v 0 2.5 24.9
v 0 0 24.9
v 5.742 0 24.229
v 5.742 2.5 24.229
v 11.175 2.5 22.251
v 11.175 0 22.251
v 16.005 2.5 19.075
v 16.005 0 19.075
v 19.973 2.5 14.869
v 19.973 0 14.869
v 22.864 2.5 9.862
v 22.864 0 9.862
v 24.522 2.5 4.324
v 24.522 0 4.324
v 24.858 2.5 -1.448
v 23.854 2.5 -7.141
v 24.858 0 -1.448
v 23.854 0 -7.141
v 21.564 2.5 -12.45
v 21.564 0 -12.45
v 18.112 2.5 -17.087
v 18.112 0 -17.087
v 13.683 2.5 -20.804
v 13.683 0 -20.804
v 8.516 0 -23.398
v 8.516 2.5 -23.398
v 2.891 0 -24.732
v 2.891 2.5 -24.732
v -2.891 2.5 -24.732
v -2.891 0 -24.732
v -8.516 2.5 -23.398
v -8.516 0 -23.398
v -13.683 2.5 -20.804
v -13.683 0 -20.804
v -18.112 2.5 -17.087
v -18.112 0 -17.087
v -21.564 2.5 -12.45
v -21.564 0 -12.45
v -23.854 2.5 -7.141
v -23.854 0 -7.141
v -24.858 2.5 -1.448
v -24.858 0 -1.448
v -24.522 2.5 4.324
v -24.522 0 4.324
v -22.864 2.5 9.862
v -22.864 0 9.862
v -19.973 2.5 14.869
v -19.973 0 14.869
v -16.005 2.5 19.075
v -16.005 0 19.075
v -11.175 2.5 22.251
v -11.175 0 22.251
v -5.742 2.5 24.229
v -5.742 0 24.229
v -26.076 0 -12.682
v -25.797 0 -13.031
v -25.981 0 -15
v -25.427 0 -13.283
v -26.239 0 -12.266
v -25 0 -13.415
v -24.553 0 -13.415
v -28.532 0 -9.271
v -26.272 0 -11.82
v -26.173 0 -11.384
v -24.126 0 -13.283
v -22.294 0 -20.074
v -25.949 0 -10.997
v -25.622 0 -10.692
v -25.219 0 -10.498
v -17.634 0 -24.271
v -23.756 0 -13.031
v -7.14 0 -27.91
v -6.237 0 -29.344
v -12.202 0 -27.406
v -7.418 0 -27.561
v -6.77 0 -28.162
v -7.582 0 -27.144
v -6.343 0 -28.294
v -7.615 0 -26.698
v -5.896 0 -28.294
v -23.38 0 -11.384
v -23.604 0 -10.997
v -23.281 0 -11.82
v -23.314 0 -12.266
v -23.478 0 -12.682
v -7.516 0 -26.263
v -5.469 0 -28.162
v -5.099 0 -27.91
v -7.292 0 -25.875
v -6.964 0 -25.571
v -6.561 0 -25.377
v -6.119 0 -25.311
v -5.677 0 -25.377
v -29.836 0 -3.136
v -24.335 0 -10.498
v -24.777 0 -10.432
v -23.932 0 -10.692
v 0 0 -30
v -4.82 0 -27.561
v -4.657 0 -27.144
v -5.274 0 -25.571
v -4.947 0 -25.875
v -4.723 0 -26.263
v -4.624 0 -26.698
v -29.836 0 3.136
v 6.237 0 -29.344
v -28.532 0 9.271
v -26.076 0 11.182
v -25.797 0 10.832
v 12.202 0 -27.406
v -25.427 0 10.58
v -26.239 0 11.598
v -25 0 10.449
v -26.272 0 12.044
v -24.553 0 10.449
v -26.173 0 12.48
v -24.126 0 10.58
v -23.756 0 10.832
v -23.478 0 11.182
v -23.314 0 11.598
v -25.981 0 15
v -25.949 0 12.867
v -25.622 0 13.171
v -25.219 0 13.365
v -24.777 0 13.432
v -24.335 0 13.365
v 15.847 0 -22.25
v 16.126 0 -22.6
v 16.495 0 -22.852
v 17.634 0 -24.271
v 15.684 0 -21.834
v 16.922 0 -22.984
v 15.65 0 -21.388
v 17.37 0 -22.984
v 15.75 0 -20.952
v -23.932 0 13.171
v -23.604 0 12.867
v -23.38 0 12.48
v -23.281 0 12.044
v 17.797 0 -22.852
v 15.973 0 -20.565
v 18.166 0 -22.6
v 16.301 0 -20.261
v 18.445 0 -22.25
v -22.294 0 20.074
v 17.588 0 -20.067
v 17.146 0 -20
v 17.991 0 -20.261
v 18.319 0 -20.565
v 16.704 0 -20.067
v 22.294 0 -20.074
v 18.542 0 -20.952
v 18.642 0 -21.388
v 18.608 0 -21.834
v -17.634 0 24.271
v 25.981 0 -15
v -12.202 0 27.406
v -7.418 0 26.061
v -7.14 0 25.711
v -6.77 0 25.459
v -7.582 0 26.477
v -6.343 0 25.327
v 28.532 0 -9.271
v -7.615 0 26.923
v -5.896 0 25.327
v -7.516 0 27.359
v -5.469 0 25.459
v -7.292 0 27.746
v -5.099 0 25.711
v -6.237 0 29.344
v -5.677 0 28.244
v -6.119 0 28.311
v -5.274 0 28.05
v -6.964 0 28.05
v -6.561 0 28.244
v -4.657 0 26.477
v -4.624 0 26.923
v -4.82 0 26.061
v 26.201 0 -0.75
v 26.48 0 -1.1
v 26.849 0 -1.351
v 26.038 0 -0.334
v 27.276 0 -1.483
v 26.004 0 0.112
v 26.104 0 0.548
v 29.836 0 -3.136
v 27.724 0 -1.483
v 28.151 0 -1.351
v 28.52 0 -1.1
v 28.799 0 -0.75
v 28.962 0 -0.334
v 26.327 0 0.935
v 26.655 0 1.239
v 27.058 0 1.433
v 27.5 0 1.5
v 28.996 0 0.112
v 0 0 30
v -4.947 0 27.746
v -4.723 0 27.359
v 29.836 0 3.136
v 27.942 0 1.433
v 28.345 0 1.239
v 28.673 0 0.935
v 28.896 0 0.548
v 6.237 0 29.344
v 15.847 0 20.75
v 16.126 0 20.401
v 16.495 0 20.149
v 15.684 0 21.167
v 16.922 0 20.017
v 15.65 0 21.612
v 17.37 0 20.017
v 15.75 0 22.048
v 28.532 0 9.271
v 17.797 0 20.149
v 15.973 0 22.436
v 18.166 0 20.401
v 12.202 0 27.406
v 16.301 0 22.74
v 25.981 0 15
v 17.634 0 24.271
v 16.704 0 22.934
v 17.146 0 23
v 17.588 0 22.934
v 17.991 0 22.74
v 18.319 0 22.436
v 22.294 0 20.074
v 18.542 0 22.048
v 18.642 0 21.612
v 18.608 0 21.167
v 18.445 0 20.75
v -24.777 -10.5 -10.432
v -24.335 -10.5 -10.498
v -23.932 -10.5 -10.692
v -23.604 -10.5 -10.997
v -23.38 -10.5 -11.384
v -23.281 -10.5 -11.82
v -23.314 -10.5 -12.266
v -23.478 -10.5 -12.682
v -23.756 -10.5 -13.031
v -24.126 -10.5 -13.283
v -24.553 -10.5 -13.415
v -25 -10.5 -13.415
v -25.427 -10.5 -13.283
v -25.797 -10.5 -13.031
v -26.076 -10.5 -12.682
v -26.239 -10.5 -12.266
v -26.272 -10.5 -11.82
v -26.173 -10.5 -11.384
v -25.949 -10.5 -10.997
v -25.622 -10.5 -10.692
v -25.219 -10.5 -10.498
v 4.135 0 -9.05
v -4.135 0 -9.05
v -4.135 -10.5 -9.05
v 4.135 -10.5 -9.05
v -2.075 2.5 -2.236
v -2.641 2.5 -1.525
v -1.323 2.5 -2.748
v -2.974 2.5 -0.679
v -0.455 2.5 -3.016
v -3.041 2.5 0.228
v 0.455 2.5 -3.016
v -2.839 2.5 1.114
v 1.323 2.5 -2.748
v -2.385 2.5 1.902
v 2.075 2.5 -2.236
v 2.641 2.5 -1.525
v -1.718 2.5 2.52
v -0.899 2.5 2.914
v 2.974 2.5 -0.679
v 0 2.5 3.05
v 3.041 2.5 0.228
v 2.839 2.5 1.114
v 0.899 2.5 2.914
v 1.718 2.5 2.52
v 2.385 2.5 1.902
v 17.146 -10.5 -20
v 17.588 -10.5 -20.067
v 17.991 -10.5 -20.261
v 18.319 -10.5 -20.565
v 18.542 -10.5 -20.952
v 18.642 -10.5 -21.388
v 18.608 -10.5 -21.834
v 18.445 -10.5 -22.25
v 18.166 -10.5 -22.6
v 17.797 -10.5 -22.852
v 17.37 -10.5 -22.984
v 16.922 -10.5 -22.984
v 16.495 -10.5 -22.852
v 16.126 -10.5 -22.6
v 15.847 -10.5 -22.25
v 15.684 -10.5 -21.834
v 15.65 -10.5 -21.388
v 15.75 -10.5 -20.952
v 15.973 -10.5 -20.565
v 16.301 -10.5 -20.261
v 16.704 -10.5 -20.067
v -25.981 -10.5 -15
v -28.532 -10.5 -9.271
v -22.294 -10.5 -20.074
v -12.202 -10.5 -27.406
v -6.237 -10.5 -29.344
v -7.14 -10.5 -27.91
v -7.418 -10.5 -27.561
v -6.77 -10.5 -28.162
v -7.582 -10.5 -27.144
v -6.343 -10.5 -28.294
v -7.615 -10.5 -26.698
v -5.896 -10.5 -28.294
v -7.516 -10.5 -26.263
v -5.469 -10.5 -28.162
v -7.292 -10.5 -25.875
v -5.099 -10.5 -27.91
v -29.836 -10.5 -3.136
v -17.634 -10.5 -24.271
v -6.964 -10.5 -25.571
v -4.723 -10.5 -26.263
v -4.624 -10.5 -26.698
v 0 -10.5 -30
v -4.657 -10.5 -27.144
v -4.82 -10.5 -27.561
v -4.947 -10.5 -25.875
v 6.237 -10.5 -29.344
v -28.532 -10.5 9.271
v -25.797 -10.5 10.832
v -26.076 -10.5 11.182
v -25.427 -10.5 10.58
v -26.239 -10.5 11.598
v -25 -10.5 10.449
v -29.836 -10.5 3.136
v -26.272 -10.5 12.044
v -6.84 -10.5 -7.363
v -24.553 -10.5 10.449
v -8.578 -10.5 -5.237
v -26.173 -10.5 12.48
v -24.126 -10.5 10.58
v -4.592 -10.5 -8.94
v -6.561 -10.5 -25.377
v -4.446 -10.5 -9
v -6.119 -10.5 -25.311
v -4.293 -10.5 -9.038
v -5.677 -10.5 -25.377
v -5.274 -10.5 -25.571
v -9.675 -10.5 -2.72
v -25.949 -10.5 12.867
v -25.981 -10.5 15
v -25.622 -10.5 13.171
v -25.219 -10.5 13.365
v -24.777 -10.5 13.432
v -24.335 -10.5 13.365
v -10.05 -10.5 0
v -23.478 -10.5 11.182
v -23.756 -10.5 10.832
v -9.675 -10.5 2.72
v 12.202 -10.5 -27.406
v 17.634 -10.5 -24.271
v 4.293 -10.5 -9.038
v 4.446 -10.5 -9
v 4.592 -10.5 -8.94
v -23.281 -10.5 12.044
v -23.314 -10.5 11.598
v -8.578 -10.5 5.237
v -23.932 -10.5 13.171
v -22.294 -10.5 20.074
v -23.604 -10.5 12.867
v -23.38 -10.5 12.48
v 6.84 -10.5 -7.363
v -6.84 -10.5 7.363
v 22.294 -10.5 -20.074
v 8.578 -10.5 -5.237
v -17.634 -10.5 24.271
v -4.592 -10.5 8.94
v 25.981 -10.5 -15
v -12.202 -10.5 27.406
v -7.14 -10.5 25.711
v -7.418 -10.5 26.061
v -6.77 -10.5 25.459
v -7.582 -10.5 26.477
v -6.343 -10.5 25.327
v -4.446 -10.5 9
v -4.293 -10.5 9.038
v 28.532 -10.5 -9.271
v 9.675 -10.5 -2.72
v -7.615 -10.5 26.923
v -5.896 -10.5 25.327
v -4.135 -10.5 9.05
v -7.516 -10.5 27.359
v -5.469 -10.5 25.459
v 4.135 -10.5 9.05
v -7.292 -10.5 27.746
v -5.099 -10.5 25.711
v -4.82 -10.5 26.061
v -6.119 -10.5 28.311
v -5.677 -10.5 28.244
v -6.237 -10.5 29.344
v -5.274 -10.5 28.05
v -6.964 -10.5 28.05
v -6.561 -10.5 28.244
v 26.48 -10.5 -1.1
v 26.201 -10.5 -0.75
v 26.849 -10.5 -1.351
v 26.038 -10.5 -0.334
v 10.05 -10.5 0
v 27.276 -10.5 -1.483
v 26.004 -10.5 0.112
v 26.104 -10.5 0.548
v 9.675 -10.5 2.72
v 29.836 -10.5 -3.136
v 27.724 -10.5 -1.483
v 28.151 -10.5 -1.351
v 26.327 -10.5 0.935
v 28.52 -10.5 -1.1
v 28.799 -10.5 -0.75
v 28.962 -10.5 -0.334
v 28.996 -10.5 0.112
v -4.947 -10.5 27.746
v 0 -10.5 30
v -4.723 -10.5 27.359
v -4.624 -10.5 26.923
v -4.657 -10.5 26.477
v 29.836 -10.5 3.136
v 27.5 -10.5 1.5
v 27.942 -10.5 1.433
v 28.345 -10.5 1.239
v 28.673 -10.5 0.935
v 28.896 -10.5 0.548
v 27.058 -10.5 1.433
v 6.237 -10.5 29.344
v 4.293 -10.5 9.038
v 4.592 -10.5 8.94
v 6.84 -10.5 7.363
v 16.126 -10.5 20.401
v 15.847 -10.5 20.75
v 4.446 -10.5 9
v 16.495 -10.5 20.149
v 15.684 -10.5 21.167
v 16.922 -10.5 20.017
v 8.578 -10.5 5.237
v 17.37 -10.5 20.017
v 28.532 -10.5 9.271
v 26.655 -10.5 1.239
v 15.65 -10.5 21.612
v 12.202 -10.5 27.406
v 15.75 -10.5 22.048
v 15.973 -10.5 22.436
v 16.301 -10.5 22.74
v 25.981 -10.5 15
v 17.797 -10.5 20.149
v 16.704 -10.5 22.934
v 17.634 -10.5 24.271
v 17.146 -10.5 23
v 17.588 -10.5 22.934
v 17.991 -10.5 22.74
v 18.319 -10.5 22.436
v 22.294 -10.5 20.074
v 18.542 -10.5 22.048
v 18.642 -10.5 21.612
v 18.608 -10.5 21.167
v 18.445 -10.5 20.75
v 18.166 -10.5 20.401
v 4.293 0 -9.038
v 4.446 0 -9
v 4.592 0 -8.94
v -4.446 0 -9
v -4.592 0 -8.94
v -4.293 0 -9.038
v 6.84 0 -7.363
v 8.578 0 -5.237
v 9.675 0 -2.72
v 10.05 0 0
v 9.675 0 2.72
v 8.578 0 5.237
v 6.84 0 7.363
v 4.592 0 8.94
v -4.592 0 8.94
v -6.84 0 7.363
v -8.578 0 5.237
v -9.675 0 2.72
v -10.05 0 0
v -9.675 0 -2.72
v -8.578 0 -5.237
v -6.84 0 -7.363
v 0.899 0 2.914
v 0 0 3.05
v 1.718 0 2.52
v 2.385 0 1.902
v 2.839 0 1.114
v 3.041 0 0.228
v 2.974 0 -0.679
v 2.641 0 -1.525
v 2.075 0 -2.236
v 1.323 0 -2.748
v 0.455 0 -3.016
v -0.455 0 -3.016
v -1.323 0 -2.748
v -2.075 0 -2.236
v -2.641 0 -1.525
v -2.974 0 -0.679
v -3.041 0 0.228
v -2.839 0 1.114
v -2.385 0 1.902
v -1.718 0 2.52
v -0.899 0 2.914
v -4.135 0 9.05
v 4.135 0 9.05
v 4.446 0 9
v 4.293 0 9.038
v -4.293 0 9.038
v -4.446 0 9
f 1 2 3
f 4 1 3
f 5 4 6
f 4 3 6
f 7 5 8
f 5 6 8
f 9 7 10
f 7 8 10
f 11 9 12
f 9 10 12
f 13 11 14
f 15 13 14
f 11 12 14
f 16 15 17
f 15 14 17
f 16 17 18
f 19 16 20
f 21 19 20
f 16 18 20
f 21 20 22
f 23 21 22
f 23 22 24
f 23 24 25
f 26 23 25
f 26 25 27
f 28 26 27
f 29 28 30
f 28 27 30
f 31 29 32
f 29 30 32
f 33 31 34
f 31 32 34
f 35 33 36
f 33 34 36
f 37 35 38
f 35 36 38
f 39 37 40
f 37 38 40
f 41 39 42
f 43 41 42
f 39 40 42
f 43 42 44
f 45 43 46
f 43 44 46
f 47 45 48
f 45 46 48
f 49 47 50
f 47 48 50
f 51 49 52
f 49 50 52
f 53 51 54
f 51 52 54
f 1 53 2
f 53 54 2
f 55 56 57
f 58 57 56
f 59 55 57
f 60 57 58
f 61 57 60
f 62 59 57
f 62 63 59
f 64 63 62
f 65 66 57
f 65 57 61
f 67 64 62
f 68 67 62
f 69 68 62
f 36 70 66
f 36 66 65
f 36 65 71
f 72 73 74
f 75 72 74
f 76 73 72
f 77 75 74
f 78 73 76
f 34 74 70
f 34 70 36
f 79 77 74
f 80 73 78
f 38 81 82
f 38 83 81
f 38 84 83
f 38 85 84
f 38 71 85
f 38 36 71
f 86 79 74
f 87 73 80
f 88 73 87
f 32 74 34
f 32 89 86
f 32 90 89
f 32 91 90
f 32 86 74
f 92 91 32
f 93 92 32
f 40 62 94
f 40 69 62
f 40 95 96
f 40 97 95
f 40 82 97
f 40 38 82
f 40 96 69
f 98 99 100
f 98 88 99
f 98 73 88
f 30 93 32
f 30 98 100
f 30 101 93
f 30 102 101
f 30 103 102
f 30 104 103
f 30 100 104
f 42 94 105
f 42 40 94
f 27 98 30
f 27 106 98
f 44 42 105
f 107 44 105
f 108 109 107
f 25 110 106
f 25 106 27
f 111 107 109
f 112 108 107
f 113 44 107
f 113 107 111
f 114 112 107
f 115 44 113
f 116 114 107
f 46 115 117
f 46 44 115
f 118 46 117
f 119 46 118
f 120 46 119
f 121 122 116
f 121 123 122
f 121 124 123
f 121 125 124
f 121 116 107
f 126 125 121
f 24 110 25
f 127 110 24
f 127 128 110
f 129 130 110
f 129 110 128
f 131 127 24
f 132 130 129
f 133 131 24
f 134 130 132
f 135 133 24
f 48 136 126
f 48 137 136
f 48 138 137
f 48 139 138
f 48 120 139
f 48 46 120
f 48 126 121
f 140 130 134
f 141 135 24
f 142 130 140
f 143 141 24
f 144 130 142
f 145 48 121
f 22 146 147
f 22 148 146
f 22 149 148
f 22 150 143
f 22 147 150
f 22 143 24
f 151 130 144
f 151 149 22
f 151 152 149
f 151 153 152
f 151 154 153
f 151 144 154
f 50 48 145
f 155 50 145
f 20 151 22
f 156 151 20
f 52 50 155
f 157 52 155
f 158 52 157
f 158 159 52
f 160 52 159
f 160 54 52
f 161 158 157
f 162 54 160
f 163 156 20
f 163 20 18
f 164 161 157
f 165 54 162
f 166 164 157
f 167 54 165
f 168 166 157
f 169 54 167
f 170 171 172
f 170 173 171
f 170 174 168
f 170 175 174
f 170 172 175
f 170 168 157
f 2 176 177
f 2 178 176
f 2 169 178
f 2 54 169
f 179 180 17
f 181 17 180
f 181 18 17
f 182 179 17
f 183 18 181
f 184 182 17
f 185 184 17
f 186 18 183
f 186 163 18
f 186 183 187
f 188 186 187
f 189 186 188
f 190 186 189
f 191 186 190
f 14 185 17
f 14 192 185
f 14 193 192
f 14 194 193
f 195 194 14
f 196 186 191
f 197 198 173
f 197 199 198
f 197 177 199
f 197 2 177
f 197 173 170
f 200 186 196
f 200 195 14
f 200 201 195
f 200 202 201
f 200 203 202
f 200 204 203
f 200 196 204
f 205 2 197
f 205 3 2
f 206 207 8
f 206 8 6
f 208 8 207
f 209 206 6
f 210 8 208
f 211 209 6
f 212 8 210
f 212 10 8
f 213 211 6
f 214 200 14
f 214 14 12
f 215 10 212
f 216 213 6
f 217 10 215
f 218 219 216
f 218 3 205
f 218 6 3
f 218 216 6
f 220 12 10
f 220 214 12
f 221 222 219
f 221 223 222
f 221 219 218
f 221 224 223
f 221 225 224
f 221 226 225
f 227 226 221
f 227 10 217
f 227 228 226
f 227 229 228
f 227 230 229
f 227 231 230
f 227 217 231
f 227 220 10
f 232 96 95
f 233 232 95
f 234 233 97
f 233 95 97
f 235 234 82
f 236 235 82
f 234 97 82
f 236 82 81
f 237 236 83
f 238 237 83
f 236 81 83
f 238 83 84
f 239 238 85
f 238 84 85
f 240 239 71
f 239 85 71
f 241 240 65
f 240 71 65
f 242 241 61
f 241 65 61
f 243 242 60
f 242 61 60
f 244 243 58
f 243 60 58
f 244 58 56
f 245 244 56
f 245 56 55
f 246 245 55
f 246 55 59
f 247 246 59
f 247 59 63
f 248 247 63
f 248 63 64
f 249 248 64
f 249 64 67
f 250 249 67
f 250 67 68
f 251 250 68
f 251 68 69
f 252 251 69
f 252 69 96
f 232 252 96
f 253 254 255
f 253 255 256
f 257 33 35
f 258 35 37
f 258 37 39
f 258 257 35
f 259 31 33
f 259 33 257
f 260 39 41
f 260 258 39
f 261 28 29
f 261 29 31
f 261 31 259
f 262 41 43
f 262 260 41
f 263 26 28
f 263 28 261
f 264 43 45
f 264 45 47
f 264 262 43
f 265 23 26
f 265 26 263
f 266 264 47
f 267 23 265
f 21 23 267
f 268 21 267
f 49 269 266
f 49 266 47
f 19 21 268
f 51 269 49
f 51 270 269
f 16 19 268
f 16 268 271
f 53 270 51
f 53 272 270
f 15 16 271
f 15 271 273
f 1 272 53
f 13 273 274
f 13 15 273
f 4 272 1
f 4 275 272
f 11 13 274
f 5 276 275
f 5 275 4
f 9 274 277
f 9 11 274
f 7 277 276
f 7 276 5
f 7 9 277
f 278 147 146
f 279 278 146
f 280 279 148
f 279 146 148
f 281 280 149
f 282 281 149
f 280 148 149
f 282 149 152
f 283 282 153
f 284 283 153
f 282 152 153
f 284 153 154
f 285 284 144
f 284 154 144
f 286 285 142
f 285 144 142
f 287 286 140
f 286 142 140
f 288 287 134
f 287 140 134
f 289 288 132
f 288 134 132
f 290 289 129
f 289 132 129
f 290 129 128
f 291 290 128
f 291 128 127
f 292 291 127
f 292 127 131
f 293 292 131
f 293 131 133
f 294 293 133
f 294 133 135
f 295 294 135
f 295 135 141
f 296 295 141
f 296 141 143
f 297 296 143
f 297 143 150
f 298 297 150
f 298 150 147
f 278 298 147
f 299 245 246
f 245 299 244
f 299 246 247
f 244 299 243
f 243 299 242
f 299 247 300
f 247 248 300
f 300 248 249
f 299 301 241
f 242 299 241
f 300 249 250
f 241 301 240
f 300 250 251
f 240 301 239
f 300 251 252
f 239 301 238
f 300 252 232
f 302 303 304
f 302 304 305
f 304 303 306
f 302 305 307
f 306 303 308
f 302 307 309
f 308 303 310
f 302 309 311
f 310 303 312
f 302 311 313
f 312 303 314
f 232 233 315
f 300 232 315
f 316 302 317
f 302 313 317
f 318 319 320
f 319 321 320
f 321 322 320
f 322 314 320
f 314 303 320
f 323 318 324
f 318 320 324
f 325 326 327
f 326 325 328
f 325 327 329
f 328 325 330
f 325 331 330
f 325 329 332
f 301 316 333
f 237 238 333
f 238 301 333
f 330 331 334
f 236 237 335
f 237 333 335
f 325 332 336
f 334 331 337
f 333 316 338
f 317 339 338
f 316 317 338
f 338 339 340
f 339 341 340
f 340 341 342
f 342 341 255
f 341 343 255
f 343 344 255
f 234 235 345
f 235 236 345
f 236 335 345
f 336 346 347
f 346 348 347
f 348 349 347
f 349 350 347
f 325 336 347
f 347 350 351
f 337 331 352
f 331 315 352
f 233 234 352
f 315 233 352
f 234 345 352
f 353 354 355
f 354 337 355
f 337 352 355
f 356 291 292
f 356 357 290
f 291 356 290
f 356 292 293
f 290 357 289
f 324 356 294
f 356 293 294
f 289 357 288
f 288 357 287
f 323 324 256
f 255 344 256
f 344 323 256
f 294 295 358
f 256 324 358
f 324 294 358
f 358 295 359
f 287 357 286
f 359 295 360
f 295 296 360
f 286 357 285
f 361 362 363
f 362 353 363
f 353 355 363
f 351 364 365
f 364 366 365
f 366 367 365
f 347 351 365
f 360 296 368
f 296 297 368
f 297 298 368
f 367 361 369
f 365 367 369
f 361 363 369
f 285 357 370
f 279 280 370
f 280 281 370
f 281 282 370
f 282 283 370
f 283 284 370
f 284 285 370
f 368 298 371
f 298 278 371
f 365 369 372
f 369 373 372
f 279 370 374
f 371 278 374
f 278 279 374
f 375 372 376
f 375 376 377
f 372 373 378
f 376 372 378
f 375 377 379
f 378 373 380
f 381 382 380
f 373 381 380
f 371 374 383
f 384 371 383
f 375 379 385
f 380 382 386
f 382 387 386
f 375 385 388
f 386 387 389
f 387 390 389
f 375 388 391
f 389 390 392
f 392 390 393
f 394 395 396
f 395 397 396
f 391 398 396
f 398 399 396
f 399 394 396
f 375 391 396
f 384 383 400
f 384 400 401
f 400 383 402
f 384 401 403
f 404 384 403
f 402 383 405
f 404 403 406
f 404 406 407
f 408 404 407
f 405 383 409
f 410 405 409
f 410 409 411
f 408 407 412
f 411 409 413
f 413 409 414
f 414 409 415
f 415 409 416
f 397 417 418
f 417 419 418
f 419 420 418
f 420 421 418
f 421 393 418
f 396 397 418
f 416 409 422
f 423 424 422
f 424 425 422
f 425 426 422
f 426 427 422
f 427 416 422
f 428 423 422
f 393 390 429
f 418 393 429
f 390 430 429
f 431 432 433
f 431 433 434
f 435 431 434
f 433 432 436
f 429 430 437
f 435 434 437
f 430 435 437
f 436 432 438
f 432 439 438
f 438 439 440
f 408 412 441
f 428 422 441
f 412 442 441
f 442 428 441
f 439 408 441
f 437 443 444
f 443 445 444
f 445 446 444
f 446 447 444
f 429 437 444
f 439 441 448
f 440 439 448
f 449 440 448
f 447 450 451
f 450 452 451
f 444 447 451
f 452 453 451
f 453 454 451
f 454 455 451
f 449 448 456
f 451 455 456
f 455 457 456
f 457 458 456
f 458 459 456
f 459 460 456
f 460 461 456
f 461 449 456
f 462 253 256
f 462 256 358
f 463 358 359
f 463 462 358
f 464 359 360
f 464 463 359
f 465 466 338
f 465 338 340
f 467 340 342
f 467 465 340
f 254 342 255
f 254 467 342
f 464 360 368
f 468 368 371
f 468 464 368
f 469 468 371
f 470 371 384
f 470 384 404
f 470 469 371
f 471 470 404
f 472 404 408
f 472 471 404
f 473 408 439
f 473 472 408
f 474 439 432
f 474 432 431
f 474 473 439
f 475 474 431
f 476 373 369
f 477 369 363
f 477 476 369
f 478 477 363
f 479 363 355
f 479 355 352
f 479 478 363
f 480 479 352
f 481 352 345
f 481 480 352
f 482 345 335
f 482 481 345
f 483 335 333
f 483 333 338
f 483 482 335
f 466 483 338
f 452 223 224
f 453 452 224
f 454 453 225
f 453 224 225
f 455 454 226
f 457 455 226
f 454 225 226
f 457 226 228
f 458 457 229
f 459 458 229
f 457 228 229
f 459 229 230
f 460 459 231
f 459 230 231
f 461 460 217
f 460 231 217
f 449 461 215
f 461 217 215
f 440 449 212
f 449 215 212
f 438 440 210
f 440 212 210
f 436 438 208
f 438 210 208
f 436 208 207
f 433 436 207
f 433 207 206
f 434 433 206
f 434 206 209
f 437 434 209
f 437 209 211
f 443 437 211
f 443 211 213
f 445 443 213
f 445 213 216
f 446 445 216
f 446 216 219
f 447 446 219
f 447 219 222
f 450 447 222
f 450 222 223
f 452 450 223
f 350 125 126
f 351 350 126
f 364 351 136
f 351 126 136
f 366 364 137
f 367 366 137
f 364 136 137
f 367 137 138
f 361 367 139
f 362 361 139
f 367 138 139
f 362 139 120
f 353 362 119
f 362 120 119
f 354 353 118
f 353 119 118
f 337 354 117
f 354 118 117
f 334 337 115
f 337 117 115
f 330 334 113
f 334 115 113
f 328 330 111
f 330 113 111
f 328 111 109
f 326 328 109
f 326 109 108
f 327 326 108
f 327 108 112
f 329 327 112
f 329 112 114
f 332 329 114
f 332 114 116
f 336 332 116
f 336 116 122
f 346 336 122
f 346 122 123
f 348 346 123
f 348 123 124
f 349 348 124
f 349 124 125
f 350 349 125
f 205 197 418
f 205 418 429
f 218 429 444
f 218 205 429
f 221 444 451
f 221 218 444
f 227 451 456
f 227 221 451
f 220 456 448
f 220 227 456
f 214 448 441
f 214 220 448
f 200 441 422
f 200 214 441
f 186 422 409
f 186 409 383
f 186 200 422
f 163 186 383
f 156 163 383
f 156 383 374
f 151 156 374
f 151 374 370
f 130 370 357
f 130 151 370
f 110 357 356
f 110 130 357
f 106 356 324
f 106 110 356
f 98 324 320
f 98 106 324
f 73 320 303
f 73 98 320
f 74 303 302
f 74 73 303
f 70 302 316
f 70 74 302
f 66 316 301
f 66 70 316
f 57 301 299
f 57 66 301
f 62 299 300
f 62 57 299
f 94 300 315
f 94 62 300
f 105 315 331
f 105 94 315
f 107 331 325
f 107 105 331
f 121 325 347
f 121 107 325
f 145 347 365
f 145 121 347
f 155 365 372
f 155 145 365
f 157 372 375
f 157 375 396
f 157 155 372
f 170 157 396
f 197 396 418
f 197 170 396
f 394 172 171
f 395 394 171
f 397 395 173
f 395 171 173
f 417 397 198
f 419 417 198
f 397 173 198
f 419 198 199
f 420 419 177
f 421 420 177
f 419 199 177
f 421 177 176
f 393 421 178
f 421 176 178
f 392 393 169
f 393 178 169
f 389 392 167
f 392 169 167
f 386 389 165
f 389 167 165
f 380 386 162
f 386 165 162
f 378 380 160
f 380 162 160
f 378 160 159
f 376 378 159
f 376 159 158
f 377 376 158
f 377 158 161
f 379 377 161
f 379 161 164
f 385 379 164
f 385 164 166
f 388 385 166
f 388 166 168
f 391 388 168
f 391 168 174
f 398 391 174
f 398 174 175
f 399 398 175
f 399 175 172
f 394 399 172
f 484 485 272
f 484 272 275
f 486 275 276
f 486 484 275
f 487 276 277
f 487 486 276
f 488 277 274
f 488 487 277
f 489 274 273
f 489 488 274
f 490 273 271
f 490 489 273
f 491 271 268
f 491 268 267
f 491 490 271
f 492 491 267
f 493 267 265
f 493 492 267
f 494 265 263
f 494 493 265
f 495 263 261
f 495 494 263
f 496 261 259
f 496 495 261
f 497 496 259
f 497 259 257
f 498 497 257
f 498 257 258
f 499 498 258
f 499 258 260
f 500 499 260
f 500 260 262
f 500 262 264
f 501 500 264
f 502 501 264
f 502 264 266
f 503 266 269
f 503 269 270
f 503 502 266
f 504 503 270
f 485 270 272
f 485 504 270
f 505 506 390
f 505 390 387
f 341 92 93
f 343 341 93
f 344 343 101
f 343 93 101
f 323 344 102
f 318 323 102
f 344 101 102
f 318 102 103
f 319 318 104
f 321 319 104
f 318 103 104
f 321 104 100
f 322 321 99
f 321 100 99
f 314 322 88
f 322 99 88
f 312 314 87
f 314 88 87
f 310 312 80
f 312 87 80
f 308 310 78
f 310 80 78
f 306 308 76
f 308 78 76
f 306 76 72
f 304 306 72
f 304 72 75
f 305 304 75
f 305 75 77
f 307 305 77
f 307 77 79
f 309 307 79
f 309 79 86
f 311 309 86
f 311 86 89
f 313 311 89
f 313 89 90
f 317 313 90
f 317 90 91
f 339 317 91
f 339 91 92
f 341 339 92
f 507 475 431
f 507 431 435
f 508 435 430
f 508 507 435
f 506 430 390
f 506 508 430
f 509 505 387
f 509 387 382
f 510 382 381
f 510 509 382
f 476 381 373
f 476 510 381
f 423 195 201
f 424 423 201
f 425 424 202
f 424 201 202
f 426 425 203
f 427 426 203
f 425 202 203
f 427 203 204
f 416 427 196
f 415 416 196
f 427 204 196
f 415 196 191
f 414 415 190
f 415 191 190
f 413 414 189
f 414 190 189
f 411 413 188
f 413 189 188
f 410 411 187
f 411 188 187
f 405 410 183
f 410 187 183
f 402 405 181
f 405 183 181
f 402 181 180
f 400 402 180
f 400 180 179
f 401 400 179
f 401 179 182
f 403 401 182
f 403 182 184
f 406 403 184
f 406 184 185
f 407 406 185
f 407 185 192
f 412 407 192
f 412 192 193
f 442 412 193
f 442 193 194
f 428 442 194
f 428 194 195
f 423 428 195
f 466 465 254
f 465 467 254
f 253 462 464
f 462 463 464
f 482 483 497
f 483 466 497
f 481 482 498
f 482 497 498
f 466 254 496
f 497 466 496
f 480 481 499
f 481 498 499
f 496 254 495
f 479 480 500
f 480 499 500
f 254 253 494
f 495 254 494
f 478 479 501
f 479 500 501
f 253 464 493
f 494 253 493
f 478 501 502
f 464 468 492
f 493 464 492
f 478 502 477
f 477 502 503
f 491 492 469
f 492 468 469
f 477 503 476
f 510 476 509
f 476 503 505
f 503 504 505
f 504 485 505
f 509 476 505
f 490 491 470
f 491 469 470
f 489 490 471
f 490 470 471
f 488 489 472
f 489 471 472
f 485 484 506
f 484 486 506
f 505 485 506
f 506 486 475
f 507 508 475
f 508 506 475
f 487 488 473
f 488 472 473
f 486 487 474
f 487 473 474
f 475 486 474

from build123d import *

# Parameters (mm, degrees)
CROQUIS1_R              = 24.9
CROQUIS1_R_2            = 3.05
SALIENTE_EXTRUIR1_DEPTH = 2.5
CROQUIS2_R              = 30
SALIENTE_EXTRUIR2_DEPTH = 10.5
CROQUIS3_R              = 1.5
CORTAR_EXTRUIR1_DEPTH   = 44.706406853


with BuildPart() as part:
    # Croquis1 → Saliente-Extruir1 (new body)
    with BuildSketch(Plane(origin=(0, 0, 0), x_dir=(1, 0, 0), z_dir=(0, 1, 0))):
        with Locations(Location((0, 0, 0), (0, 0, 270))):
            Circle(CROQUIS1_R)
        with Locations(Location((0, 0, 0), (0, 0, 270))):
            Circle(CROQUIS1_R_2, mode=Mode.SUBTRACT)
    extrude(amount=SALIENTE_EXTRUIR1_DEPTH)

    # Croquis2 → Saliente-Extruir2 (add)
    with BuildSketch(Plane(origin=(0, 0, 0), x_dir=(1, 0, 0), z_dir=(0, 1, 0))):
        with Locations(Location((0, 0, 0), (0, 0, 270))):
            Circle(CROQUIS2_R)
        with BuildLine():
            Line((-4.135214626, 9.05), (4.135214626, 9.05))
            ThreePointArc((4.135214626, 9.05), (4.370264873, 9.021983221), (4.592144419, 8.939502762))
            ThreePointArc((4.592144419, 8.939502762), (10.05, 0), (4.592144419, -8.939502762))
            ThreePointArc((4.592144419, -8.939502762), (4.370264873, -9.021983221), (4.135214626, -9.05))
            Line((4.135214626, -9.05), (-4.135214626, -9.05))
            ThreePointArc((-4.135214626, -9.05), (-4.370264873, -9.021983221), (-4.592144419, -8.939502762))
            ThreePointArc((-4.592144419, -8.939502762), (-10.05, 0), (-4.592144419, 8.939502762))
            ThreePointArc((-4.592144419, 8.939502762), (-4.370264873, 9.021983221), (-4.135214626, 9.05))
        make_face(mode=Mode.SUBTRACT)
    extrude(amount=-SALIENTE_EXTRUIR2_DEPTH)

    # Croquis3 → Cortar-Extruir1 (cut, through all)
    with BuildSketch(Plane(origin=(0, 0, 0), x_dir=(1, 0, 0), z_dir=(0, 1, 0))):
        with Locations(Location((27.5, 0, 0), (0, 0, 270))):
            Circle(CROQUIS3_R)
        with Locations(Location((17.145969551, -21.500365768, 0), (0, 0, 270))):
            Circle(CROQUIS3_R)
        with Locations(Location((-6.119325684, -26.810517585, 0), (0, 0, 270))):
            Circle(CROQUIS3_R)
        with Locations(Location((-24.776643867, -11.931802826, 0), (0, 0, 270))):
            Circle(CROQUIS3_R)
        with Locations(Location((-24.776643867, 11.931802826, 0), (0, 0, 270))):
            Circle(CROQUIS3_R)
        with Locations(Location((-6.119325684, 26.810517585, 0), (0, 0, 270))):
            Circle(CROQUIS3_R)
        with Locations(Location((17.145969551, 21.500365768, 0), (0, 0, 270))):
            Circle(CROQUIS3_R)
    extrude(amount=-CORTAR_EXTRUIR1_DEPTH, mode=Mode.SUBTRACT)


solid = part.part
